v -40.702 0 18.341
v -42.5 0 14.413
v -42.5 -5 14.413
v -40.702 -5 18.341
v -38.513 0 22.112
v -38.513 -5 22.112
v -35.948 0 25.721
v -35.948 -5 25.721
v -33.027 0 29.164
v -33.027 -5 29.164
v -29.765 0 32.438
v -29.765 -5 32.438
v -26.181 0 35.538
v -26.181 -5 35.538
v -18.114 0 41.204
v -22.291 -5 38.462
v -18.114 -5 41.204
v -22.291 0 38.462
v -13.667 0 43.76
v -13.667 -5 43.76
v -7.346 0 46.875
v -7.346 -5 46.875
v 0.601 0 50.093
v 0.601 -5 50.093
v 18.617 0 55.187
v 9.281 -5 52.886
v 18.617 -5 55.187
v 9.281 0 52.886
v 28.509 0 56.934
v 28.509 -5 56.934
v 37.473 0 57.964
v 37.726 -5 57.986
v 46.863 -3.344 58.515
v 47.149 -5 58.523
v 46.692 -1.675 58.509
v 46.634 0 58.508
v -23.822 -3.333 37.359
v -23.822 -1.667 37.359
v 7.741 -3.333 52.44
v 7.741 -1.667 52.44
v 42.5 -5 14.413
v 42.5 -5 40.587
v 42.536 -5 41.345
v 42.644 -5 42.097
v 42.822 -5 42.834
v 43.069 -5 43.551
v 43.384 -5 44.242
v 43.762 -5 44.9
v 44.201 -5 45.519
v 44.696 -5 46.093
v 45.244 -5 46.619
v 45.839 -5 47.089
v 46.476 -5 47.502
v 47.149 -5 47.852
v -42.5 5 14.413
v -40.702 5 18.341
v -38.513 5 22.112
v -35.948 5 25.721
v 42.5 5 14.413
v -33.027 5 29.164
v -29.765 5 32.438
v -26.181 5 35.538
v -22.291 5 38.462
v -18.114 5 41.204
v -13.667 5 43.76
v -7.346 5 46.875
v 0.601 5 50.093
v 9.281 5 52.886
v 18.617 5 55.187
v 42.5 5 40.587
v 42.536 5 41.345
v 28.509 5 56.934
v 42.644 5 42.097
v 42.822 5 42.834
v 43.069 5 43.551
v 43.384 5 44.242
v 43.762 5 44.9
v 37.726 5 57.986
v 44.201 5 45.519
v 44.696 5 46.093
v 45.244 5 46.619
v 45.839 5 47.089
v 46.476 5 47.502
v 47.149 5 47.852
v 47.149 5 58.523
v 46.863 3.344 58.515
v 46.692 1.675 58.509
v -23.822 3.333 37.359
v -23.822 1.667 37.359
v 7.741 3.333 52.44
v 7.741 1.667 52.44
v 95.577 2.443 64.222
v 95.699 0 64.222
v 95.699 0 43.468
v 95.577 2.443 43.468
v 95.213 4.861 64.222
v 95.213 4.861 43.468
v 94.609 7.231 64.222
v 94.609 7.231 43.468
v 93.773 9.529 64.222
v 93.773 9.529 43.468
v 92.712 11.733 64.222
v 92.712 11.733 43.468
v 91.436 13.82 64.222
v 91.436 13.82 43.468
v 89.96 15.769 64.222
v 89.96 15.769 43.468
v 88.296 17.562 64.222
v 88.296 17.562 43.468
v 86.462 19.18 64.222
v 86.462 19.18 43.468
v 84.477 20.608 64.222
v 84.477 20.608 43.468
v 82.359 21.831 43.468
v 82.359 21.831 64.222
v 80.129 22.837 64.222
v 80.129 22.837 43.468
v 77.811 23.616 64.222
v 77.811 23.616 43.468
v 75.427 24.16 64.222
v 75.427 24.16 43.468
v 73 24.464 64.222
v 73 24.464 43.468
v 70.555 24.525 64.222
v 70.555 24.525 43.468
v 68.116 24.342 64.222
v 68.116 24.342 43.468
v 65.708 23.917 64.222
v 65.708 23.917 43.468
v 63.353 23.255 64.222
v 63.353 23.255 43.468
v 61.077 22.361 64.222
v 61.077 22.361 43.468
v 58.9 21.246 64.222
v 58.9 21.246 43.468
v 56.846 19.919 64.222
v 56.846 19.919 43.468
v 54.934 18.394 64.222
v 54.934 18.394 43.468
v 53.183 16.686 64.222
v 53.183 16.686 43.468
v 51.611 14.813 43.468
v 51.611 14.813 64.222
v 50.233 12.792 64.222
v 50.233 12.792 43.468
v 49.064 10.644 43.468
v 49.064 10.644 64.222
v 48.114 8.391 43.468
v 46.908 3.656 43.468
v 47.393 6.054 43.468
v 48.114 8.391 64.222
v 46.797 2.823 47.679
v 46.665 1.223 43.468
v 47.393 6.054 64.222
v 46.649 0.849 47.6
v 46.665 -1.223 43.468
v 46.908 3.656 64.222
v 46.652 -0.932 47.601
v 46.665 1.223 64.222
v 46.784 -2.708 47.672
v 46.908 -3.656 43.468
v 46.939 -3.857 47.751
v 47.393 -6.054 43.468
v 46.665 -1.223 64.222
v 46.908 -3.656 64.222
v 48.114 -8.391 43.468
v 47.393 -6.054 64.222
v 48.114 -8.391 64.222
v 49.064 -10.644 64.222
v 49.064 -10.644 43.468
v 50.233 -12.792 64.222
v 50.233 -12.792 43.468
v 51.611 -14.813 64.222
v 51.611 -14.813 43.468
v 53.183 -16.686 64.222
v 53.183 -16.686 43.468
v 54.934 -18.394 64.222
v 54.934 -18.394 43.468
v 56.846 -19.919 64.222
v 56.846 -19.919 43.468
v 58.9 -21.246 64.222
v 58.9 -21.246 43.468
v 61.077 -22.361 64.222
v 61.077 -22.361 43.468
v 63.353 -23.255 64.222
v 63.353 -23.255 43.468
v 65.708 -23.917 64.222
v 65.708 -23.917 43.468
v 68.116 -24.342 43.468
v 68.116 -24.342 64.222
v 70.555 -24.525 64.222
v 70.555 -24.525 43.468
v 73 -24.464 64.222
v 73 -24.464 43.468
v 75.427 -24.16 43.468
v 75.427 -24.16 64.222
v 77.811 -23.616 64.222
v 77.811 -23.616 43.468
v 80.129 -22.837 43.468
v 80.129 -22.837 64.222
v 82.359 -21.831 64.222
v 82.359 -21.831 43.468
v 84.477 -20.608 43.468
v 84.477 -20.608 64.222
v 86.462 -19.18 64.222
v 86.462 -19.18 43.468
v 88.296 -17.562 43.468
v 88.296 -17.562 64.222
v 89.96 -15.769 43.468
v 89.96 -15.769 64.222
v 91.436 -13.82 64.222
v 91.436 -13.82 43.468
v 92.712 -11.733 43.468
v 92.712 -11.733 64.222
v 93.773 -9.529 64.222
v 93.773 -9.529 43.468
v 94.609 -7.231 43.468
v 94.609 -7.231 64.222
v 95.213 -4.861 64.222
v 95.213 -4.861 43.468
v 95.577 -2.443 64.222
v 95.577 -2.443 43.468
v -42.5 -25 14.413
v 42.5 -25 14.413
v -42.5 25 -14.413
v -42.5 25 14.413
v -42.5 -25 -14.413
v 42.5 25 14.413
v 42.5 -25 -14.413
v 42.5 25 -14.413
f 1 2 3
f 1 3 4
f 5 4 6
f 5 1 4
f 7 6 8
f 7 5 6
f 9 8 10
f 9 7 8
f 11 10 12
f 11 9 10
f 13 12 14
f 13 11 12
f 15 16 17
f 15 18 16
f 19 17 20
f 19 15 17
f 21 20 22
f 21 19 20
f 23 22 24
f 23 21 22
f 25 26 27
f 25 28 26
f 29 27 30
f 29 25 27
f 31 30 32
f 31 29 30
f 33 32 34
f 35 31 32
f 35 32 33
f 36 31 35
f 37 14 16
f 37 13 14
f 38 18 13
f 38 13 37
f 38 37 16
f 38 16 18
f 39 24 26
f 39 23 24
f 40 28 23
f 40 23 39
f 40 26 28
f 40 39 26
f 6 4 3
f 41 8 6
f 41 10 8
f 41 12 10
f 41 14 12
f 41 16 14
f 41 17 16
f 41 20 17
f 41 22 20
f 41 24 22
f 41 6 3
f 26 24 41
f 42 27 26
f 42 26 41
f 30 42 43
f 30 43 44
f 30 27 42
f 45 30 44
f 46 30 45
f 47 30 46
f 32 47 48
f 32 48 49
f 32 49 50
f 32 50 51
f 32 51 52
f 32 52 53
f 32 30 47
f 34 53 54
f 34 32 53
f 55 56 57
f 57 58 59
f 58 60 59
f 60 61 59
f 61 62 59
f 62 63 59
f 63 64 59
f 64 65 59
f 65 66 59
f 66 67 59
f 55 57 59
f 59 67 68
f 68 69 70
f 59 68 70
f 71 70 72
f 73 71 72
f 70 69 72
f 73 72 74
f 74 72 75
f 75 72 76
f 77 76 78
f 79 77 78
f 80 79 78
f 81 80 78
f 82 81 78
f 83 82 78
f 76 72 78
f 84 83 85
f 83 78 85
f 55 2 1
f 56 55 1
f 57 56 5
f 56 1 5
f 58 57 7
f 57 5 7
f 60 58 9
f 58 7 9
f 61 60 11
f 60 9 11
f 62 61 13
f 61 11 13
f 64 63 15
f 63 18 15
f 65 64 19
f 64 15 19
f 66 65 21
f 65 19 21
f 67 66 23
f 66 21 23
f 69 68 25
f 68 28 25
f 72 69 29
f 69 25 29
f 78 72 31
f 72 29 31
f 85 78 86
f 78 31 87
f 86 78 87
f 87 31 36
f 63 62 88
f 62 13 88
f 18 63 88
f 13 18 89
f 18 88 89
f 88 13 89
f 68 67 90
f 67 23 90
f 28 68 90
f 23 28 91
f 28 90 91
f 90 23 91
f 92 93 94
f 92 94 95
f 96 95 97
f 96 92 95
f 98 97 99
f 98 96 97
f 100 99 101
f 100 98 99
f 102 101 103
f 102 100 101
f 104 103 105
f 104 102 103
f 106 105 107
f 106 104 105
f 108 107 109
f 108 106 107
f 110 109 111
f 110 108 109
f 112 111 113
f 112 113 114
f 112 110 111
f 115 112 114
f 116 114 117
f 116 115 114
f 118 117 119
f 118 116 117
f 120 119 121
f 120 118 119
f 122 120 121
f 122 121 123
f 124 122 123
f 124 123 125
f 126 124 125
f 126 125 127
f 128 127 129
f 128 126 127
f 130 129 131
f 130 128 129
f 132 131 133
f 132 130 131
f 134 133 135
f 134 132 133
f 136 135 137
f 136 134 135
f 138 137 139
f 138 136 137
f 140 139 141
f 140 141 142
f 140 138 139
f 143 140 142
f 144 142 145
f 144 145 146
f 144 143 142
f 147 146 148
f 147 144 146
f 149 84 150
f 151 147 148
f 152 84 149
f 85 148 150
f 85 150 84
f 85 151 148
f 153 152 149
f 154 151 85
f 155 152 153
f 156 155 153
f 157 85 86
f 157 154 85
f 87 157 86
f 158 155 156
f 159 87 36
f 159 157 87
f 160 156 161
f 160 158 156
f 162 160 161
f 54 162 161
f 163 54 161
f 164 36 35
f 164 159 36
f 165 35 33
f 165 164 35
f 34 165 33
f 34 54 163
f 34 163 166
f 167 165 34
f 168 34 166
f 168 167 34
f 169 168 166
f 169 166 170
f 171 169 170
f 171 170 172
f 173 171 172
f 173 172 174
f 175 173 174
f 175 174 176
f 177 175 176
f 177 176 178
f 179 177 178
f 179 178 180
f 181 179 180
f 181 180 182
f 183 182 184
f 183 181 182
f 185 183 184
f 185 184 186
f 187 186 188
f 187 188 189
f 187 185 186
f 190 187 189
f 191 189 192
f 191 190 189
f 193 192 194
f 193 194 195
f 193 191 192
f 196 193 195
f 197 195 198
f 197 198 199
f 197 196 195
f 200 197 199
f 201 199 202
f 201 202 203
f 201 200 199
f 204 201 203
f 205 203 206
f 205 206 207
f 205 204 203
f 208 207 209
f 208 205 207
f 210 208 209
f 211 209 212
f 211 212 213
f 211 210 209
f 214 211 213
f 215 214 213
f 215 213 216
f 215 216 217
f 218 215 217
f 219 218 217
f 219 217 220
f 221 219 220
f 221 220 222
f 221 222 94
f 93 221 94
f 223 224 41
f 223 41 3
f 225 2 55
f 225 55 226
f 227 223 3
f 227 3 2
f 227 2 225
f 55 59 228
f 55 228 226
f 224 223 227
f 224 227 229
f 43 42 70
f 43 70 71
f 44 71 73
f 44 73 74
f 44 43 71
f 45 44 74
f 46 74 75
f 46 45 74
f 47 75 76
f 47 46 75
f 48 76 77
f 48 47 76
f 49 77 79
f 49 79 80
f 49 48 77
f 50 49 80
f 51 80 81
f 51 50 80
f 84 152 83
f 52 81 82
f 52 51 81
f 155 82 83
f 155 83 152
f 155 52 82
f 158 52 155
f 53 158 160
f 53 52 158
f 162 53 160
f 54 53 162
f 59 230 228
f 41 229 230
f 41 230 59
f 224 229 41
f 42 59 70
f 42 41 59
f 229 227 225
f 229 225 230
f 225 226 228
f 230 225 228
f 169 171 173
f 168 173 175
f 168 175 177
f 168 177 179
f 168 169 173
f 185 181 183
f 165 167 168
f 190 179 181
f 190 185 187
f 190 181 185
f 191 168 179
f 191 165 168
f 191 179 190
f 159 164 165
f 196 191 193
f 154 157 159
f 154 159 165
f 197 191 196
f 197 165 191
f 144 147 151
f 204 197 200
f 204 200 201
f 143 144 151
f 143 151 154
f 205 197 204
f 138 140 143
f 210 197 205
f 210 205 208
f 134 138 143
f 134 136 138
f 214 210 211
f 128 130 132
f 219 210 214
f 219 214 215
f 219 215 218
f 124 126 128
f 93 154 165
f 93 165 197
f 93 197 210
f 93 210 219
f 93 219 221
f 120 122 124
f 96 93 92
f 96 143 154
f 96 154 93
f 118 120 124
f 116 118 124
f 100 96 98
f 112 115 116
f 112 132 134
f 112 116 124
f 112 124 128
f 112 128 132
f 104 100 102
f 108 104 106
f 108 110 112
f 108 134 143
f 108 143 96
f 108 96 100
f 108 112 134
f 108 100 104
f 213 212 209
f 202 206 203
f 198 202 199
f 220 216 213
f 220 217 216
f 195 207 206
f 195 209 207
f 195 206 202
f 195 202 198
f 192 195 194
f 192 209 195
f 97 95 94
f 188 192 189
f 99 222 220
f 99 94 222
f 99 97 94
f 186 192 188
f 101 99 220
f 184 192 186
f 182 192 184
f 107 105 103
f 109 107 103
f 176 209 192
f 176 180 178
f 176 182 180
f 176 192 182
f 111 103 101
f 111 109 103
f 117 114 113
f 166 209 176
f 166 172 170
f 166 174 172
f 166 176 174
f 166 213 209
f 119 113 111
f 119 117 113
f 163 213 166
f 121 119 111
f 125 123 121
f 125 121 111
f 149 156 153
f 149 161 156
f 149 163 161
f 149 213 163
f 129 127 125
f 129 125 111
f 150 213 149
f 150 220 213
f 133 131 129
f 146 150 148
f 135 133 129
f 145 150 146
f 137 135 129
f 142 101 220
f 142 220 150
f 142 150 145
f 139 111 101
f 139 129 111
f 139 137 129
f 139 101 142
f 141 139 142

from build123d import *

# Parameters (mm, degrees)
F1_DEPTH = 25
F2_DEPTH = 5


with BuildPart() as f1:
    # F0 (on Front) → F1 (new body, symmetric)
    with BuildSketch(Plane.XZ):
        Polygon((32.5, 14.412519), (-42.5, 14.412519), (-42.5, -14.412519), (42.5, -14.412519), (42.5, 14.412519), align=None)
    extrude(amount=F1_DEPTH, both=True)

    # F0 (on Front) → F2 (join, symmetric)
    with BuildSketch(Plane.XZ):
        with BuildLine():
            Line((32.5, 40.587481), (32.5, 14.412519))
            Line((32.5, 14.412519), (42.5, 14.412519))
            Line((42.5, 14.412519), (42.5, 40.587481))
            ThreePointArc((42.5, 40.587481), (44.843146, 46.244336), (50.5, 48.587481))
            Line((50.5, 48.587481), (65.721087, 48.587481))
            Line((65.721087, 48.587481), (65.721087, 58.587481))
            Line((65.721087, 58.587481), (50.5, 58.587481))
            add(Edge.make_bspline(
                [(50.123601, 58.583546), (50.249035, 58.584995), (50.374501, 58.586307), (50.5, 58.587481)],
                knots=[102.657738, 102.657738, 102.657738, 102.657738, 102.958377, 102.958377, 102.958377, 102.958377], degree=3))
            ThreePointArc((50.123601, 58.583546), (37.639689, 53.181623), (32.5, 40.587481))
        make_face()
        with BuildLine():
            add(Edge.make_bspline(
                [(-42.5, 14.412519), (-31.693433, 41.543898), (7.292415, 58.088539), (50.123601, 58.583546)],
                knots=[0, 0, 0, 0, 102.657738, 102.657738, 102.657738, 102.657738], degree=3))
            Line((-42.5, 14.412519), (32.5, 14.412519))
            Line((32.5, 14.412519), (32.5, 40.587481))
            ThreePointArc((32.5, 40.587481), (37.639689, 53.181623), (50.123601, 58.583546))
        make_face()
    extrude(amount=F2_DEPTH, both=True)

    # F0 (on Front) → F3 (revolve)
    with BuildSketch(Plane.XZ):
        Polygon((71.16668, 64.222187), (71.16668, 58.587481), (71.16668, 48.587481), (71.16668, 43.468155), (95.699124, 43.468155), (95.699124, 64.222187), align=None)
    revolve(axis=Axis((71.16668, 0, 53.845171), (0, 0, 1)))


solid = f1.part
